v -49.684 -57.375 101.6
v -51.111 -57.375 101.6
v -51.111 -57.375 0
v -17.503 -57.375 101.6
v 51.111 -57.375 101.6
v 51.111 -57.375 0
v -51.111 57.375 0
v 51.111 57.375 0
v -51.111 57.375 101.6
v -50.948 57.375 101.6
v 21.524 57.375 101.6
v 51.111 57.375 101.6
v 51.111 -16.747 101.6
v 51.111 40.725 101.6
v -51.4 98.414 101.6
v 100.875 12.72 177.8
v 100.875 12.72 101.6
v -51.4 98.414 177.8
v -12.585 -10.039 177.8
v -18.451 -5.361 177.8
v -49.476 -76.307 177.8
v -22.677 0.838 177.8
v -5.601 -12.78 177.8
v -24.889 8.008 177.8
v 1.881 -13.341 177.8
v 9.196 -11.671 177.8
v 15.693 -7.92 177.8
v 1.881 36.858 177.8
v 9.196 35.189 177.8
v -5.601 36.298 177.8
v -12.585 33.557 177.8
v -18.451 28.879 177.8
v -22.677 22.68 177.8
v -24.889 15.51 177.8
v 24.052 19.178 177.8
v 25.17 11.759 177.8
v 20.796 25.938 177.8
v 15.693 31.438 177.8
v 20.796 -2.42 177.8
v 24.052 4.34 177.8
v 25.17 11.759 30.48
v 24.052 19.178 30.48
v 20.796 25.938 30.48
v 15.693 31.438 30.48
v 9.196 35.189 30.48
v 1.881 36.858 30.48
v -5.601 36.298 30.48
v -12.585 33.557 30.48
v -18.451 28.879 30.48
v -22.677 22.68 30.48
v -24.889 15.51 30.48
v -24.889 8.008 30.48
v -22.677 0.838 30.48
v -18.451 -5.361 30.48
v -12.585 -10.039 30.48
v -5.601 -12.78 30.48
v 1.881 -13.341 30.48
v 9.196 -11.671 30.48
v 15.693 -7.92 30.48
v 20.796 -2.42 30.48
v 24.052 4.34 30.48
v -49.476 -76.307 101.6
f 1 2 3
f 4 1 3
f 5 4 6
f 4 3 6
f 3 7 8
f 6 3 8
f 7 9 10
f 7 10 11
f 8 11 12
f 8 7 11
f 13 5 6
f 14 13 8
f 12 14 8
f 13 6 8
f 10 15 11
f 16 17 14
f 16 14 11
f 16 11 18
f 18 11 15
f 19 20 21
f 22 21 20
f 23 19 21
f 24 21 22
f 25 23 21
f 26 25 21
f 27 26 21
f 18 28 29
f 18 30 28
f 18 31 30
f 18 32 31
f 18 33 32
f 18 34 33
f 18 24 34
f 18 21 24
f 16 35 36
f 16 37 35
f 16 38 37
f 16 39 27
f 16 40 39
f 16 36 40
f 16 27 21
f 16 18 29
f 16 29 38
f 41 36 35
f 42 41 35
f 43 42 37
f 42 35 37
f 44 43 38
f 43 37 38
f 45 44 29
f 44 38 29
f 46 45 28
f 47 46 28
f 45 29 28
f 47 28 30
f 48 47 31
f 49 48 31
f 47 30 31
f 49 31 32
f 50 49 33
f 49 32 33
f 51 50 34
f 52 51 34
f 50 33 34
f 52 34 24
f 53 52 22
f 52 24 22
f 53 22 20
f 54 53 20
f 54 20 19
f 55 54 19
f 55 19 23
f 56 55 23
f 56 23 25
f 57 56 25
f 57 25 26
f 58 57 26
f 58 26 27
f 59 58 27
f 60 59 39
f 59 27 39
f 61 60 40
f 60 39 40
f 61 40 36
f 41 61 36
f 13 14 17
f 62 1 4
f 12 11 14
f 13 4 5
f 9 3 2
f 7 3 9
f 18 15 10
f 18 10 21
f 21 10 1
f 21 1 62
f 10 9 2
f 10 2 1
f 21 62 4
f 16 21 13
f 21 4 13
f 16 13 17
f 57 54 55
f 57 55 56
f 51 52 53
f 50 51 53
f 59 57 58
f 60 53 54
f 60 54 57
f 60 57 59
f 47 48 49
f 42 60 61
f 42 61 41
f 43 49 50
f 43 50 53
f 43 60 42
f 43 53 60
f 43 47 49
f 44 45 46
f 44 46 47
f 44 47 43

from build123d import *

# Parameters (mm, degrees)
F0_W     = 102.221594
F0_H     = 114.750422
F1_DEPTH = 101.6
F3_DEPTH = 76.2
F4_R     = 25.169937
F5_DEPTH = 147.32


with BuildPart() as f1:
    # F0 (on Top) → F1 (new body)
    with BuildSketch(Plane.XY):
        Rectangle(F0_W, F0_H)
    extrude(amount=F1_DEPTH)

    # F2 (on face) → F3 (join)
    with BuildSketch(Plane.XY.offset(101.6)):
        Polygon((-49.475546, -76.307332), (100.875381, 12.719793), (-51.399834, 98.413953), align=None)
    extrude(amount=F3_DEPTH)

    # F4 (on face) → F5 (cut)
    with BuildSketch(Plane.XY.offset(177.8)):
        with Locations((0, 11.758941)):
            Circle(F4_R)
    extrude(amount=-F5_DEPTH, mode=Mode.SUBTRACT)


solid = f1.part
